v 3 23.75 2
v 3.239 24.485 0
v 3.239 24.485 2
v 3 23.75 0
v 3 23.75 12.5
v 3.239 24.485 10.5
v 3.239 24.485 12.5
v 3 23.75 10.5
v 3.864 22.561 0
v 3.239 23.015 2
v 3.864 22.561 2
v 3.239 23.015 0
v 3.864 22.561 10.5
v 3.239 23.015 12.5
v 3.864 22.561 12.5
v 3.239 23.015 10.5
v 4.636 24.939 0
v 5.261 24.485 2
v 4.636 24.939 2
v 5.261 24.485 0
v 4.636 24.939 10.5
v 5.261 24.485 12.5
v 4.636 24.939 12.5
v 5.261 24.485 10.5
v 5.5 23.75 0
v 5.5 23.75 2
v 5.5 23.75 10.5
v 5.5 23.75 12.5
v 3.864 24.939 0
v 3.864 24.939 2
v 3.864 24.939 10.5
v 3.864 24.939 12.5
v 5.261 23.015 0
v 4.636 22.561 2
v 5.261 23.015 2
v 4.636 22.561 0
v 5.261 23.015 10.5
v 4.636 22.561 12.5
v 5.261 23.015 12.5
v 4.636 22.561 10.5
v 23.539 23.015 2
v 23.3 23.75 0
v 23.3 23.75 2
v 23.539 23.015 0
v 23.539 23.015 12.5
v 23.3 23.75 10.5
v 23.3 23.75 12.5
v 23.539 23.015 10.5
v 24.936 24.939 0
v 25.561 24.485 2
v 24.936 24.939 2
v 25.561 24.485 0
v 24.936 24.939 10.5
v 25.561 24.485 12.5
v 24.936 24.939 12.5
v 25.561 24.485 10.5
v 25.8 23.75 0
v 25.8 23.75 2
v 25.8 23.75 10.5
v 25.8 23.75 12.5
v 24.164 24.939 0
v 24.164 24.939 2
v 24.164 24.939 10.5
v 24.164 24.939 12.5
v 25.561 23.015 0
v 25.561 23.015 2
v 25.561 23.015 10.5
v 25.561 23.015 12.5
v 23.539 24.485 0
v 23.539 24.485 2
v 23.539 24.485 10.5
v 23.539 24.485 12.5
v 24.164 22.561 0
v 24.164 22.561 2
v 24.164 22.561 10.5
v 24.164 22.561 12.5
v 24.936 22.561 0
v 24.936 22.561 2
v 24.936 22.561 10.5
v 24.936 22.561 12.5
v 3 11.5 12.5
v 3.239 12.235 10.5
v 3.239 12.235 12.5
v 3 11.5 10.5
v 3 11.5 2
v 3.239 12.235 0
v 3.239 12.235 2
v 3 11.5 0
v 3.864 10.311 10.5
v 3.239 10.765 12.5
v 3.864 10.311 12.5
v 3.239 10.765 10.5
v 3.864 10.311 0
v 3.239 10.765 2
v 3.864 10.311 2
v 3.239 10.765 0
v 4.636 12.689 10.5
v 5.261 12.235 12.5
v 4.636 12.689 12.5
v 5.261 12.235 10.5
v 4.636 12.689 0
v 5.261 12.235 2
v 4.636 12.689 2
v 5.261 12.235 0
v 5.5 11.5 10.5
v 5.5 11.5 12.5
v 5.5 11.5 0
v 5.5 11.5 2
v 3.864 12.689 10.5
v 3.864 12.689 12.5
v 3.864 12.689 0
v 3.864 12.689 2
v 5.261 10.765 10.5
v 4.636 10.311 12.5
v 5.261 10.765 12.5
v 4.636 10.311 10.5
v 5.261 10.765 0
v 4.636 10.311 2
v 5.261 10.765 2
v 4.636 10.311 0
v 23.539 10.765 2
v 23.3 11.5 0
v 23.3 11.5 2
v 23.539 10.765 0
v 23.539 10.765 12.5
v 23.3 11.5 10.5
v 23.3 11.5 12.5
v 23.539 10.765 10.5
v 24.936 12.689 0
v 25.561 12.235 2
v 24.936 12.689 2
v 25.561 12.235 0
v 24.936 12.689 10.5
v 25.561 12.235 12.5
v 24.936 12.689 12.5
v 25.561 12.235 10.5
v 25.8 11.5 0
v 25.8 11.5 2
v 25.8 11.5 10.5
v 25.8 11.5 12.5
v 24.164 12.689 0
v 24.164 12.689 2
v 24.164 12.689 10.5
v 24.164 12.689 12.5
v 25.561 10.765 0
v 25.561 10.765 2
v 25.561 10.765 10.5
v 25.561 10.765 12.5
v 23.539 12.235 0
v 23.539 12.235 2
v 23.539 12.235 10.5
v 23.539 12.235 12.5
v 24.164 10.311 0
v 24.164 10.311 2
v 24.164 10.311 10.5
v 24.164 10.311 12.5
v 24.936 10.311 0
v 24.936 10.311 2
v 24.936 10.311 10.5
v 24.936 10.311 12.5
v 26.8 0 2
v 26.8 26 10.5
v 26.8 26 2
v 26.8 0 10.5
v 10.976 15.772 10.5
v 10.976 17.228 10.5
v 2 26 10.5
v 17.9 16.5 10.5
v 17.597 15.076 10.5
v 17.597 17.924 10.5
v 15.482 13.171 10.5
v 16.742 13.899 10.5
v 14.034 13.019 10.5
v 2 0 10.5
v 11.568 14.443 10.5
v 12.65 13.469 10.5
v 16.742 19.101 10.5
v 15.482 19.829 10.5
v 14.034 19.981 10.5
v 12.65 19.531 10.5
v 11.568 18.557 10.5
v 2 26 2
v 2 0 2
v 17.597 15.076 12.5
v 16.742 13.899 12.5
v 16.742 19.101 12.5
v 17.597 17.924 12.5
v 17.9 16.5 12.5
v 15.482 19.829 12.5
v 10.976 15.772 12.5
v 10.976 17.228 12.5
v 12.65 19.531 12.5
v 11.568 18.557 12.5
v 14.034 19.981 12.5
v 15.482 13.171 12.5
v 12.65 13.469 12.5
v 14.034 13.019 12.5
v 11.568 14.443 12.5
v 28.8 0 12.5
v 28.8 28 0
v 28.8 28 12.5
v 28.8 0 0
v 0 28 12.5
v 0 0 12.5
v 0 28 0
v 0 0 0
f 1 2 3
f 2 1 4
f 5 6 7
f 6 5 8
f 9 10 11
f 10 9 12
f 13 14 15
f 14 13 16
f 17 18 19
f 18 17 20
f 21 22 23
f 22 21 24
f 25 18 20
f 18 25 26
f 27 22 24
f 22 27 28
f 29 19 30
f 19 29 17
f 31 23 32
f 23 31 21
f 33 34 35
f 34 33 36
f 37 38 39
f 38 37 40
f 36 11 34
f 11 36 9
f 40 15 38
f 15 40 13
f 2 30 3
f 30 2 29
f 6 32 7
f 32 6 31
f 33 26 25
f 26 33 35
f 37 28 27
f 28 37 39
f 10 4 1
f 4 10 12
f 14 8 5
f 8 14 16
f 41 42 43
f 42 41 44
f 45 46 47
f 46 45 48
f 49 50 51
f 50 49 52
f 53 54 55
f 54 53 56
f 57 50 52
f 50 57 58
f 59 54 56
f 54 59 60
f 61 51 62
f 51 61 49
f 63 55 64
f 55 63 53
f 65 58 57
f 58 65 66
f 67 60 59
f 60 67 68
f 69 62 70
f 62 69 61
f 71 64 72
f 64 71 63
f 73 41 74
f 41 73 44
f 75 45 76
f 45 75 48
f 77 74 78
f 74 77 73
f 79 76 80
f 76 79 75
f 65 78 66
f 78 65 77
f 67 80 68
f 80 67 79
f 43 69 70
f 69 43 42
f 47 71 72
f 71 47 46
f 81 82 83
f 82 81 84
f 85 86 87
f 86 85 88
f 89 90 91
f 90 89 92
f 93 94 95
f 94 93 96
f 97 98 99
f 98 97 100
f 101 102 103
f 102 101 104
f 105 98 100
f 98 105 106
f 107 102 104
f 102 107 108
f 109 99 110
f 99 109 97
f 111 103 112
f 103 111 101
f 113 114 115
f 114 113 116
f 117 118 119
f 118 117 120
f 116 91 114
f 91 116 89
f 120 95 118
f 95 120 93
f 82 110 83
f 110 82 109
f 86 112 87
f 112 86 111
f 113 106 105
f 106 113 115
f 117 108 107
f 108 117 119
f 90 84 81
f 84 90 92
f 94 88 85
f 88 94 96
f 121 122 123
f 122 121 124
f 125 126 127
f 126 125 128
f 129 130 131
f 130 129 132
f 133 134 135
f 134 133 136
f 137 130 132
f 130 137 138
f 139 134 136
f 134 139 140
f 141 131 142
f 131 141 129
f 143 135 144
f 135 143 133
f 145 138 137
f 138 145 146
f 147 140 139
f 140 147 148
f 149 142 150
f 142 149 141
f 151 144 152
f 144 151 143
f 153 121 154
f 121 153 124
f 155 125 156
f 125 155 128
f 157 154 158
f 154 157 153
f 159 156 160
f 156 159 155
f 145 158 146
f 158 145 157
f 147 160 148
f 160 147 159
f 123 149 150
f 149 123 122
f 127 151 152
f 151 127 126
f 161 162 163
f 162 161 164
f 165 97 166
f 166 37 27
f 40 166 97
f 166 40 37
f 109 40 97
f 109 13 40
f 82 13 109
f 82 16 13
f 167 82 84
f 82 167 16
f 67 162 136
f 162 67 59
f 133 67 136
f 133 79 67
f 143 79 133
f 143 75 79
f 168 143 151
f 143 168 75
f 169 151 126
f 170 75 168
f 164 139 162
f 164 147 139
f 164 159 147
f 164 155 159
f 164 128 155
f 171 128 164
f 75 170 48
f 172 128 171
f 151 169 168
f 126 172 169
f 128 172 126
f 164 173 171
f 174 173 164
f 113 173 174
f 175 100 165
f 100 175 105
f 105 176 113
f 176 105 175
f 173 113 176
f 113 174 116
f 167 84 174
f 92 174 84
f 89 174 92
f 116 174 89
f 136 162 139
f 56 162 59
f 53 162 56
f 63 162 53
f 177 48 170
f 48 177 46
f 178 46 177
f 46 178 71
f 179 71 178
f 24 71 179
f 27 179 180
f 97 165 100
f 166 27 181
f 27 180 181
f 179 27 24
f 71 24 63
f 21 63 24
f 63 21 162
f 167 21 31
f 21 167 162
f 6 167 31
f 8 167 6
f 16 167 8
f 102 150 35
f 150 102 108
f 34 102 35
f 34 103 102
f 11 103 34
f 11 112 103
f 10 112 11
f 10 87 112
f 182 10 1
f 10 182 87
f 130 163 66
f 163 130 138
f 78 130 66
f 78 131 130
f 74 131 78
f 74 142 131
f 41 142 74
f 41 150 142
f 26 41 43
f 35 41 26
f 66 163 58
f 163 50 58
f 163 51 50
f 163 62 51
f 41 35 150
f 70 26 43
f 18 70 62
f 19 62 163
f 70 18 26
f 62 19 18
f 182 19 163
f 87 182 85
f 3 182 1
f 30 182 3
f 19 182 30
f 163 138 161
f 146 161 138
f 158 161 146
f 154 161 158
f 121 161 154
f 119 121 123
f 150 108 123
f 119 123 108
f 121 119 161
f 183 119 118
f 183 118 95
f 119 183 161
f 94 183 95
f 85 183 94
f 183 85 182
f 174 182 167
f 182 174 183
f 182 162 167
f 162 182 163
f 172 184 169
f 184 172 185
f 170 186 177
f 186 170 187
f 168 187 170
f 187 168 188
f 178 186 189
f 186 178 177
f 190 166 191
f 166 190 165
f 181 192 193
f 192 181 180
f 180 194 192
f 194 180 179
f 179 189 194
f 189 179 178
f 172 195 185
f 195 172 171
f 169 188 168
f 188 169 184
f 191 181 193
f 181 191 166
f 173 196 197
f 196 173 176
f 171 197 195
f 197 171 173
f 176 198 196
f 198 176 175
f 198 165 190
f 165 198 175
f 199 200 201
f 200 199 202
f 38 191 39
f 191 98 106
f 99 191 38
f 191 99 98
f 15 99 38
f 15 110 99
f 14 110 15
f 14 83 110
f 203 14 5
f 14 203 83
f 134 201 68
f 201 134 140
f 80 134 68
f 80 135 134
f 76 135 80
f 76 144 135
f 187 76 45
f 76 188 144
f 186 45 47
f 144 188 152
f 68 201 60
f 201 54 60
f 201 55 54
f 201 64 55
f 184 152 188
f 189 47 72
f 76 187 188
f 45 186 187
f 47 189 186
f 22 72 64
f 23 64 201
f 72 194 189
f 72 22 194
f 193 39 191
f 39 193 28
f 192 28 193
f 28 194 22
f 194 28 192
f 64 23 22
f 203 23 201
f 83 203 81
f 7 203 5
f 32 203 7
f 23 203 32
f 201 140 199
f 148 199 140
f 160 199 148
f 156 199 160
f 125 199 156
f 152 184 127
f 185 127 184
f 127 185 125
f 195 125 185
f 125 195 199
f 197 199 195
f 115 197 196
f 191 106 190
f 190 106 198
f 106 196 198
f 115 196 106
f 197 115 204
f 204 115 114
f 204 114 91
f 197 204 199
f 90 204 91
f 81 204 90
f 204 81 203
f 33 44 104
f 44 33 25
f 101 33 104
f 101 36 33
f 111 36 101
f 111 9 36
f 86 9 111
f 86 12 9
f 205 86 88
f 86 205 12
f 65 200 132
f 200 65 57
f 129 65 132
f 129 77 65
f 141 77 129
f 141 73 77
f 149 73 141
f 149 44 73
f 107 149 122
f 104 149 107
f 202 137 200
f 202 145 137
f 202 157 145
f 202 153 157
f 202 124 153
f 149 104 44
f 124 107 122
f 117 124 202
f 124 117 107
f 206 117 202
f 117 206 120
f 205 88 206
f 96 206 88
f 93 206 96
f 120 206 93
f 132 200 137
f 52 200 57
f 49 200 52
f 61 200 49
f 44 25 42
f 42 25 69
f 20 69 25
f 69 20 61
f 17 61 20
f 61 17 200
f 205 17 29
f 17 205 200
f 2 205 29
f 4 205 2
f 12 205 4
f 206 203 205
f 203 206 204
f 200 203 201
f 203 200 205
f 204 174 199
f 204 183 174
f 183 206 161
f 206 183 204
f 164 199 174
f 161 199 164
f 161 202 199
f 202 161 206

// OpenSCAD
m2_screw_width=2.5;

rpic_bounding_height=8.5;
rpic_bounding_length=24;
rpic_bounding_width=24.8;

rpic_camera_rise=5;

wall_thickness=2;

rpic_screw_edge_offset=1;
rpic_screw_center_offset=rpic_screw_edge_offset+m2_screw_width/2;
rpic_screw_midling_offset=14.5;

rpic_screw_wall_center_offset=rpic_screw_center_offset+wall_thickness;
rpic_screw_wall_midling_offset=rpic_screw_midling_offset+wall_thickness;

case_height=rpic_bounding_height+wall_thickness*2;
case_length=rpic_bounding_length+wall_thickness*2;
case_width=rpic_bounding_width+wall_thickness*2;

rpic_pinhole_length_center=14.5;
rpic_pinhole_width_center=rpic_bounding_width/2;
rpic_pinhole_diameter=7;

module m2_screw() {
    translate([0,0,case_height/2]) cylinder(h=case_height*2,d=m2_screw_width,$fn=10,center=true);
}

difference() {
    cube([case_width,case_length,case_height]);

    union() {
        translate([rpic_screw_wall_center_offset,case_length-rpic_screw_wall_center_offset,0]) m2_screw();
        translate([case_width-rpic_screw_wall_center_offset,case_length-rpic_screw_wall_center_offset,0]) m2_screw();
        translate([rpic_screw_wall_center_offset,case_length-rpic_screw_wall_midling_offset,0]) m2_screw();
        translate([case_width-rpic_screw_wall_center_offset,case_length-rpic_screw_wall_midling_offset,0]) m2_screw();

        translate([wall_thickness,-1,wall_thickness])
        cube([rpic_bounding_width,rpic_bounding_length+wall_thickness+1,rpic_bounding_height]);

        translate([wall_thickness+rpic_pinhole_width_center,wall_thickness+rpic_pinhole_length_center,case_height-wall_thickness])
        cylinder(h=wall_thickness*2,d=rpic_pinhole_diameter,$fn=15);
    }
}
